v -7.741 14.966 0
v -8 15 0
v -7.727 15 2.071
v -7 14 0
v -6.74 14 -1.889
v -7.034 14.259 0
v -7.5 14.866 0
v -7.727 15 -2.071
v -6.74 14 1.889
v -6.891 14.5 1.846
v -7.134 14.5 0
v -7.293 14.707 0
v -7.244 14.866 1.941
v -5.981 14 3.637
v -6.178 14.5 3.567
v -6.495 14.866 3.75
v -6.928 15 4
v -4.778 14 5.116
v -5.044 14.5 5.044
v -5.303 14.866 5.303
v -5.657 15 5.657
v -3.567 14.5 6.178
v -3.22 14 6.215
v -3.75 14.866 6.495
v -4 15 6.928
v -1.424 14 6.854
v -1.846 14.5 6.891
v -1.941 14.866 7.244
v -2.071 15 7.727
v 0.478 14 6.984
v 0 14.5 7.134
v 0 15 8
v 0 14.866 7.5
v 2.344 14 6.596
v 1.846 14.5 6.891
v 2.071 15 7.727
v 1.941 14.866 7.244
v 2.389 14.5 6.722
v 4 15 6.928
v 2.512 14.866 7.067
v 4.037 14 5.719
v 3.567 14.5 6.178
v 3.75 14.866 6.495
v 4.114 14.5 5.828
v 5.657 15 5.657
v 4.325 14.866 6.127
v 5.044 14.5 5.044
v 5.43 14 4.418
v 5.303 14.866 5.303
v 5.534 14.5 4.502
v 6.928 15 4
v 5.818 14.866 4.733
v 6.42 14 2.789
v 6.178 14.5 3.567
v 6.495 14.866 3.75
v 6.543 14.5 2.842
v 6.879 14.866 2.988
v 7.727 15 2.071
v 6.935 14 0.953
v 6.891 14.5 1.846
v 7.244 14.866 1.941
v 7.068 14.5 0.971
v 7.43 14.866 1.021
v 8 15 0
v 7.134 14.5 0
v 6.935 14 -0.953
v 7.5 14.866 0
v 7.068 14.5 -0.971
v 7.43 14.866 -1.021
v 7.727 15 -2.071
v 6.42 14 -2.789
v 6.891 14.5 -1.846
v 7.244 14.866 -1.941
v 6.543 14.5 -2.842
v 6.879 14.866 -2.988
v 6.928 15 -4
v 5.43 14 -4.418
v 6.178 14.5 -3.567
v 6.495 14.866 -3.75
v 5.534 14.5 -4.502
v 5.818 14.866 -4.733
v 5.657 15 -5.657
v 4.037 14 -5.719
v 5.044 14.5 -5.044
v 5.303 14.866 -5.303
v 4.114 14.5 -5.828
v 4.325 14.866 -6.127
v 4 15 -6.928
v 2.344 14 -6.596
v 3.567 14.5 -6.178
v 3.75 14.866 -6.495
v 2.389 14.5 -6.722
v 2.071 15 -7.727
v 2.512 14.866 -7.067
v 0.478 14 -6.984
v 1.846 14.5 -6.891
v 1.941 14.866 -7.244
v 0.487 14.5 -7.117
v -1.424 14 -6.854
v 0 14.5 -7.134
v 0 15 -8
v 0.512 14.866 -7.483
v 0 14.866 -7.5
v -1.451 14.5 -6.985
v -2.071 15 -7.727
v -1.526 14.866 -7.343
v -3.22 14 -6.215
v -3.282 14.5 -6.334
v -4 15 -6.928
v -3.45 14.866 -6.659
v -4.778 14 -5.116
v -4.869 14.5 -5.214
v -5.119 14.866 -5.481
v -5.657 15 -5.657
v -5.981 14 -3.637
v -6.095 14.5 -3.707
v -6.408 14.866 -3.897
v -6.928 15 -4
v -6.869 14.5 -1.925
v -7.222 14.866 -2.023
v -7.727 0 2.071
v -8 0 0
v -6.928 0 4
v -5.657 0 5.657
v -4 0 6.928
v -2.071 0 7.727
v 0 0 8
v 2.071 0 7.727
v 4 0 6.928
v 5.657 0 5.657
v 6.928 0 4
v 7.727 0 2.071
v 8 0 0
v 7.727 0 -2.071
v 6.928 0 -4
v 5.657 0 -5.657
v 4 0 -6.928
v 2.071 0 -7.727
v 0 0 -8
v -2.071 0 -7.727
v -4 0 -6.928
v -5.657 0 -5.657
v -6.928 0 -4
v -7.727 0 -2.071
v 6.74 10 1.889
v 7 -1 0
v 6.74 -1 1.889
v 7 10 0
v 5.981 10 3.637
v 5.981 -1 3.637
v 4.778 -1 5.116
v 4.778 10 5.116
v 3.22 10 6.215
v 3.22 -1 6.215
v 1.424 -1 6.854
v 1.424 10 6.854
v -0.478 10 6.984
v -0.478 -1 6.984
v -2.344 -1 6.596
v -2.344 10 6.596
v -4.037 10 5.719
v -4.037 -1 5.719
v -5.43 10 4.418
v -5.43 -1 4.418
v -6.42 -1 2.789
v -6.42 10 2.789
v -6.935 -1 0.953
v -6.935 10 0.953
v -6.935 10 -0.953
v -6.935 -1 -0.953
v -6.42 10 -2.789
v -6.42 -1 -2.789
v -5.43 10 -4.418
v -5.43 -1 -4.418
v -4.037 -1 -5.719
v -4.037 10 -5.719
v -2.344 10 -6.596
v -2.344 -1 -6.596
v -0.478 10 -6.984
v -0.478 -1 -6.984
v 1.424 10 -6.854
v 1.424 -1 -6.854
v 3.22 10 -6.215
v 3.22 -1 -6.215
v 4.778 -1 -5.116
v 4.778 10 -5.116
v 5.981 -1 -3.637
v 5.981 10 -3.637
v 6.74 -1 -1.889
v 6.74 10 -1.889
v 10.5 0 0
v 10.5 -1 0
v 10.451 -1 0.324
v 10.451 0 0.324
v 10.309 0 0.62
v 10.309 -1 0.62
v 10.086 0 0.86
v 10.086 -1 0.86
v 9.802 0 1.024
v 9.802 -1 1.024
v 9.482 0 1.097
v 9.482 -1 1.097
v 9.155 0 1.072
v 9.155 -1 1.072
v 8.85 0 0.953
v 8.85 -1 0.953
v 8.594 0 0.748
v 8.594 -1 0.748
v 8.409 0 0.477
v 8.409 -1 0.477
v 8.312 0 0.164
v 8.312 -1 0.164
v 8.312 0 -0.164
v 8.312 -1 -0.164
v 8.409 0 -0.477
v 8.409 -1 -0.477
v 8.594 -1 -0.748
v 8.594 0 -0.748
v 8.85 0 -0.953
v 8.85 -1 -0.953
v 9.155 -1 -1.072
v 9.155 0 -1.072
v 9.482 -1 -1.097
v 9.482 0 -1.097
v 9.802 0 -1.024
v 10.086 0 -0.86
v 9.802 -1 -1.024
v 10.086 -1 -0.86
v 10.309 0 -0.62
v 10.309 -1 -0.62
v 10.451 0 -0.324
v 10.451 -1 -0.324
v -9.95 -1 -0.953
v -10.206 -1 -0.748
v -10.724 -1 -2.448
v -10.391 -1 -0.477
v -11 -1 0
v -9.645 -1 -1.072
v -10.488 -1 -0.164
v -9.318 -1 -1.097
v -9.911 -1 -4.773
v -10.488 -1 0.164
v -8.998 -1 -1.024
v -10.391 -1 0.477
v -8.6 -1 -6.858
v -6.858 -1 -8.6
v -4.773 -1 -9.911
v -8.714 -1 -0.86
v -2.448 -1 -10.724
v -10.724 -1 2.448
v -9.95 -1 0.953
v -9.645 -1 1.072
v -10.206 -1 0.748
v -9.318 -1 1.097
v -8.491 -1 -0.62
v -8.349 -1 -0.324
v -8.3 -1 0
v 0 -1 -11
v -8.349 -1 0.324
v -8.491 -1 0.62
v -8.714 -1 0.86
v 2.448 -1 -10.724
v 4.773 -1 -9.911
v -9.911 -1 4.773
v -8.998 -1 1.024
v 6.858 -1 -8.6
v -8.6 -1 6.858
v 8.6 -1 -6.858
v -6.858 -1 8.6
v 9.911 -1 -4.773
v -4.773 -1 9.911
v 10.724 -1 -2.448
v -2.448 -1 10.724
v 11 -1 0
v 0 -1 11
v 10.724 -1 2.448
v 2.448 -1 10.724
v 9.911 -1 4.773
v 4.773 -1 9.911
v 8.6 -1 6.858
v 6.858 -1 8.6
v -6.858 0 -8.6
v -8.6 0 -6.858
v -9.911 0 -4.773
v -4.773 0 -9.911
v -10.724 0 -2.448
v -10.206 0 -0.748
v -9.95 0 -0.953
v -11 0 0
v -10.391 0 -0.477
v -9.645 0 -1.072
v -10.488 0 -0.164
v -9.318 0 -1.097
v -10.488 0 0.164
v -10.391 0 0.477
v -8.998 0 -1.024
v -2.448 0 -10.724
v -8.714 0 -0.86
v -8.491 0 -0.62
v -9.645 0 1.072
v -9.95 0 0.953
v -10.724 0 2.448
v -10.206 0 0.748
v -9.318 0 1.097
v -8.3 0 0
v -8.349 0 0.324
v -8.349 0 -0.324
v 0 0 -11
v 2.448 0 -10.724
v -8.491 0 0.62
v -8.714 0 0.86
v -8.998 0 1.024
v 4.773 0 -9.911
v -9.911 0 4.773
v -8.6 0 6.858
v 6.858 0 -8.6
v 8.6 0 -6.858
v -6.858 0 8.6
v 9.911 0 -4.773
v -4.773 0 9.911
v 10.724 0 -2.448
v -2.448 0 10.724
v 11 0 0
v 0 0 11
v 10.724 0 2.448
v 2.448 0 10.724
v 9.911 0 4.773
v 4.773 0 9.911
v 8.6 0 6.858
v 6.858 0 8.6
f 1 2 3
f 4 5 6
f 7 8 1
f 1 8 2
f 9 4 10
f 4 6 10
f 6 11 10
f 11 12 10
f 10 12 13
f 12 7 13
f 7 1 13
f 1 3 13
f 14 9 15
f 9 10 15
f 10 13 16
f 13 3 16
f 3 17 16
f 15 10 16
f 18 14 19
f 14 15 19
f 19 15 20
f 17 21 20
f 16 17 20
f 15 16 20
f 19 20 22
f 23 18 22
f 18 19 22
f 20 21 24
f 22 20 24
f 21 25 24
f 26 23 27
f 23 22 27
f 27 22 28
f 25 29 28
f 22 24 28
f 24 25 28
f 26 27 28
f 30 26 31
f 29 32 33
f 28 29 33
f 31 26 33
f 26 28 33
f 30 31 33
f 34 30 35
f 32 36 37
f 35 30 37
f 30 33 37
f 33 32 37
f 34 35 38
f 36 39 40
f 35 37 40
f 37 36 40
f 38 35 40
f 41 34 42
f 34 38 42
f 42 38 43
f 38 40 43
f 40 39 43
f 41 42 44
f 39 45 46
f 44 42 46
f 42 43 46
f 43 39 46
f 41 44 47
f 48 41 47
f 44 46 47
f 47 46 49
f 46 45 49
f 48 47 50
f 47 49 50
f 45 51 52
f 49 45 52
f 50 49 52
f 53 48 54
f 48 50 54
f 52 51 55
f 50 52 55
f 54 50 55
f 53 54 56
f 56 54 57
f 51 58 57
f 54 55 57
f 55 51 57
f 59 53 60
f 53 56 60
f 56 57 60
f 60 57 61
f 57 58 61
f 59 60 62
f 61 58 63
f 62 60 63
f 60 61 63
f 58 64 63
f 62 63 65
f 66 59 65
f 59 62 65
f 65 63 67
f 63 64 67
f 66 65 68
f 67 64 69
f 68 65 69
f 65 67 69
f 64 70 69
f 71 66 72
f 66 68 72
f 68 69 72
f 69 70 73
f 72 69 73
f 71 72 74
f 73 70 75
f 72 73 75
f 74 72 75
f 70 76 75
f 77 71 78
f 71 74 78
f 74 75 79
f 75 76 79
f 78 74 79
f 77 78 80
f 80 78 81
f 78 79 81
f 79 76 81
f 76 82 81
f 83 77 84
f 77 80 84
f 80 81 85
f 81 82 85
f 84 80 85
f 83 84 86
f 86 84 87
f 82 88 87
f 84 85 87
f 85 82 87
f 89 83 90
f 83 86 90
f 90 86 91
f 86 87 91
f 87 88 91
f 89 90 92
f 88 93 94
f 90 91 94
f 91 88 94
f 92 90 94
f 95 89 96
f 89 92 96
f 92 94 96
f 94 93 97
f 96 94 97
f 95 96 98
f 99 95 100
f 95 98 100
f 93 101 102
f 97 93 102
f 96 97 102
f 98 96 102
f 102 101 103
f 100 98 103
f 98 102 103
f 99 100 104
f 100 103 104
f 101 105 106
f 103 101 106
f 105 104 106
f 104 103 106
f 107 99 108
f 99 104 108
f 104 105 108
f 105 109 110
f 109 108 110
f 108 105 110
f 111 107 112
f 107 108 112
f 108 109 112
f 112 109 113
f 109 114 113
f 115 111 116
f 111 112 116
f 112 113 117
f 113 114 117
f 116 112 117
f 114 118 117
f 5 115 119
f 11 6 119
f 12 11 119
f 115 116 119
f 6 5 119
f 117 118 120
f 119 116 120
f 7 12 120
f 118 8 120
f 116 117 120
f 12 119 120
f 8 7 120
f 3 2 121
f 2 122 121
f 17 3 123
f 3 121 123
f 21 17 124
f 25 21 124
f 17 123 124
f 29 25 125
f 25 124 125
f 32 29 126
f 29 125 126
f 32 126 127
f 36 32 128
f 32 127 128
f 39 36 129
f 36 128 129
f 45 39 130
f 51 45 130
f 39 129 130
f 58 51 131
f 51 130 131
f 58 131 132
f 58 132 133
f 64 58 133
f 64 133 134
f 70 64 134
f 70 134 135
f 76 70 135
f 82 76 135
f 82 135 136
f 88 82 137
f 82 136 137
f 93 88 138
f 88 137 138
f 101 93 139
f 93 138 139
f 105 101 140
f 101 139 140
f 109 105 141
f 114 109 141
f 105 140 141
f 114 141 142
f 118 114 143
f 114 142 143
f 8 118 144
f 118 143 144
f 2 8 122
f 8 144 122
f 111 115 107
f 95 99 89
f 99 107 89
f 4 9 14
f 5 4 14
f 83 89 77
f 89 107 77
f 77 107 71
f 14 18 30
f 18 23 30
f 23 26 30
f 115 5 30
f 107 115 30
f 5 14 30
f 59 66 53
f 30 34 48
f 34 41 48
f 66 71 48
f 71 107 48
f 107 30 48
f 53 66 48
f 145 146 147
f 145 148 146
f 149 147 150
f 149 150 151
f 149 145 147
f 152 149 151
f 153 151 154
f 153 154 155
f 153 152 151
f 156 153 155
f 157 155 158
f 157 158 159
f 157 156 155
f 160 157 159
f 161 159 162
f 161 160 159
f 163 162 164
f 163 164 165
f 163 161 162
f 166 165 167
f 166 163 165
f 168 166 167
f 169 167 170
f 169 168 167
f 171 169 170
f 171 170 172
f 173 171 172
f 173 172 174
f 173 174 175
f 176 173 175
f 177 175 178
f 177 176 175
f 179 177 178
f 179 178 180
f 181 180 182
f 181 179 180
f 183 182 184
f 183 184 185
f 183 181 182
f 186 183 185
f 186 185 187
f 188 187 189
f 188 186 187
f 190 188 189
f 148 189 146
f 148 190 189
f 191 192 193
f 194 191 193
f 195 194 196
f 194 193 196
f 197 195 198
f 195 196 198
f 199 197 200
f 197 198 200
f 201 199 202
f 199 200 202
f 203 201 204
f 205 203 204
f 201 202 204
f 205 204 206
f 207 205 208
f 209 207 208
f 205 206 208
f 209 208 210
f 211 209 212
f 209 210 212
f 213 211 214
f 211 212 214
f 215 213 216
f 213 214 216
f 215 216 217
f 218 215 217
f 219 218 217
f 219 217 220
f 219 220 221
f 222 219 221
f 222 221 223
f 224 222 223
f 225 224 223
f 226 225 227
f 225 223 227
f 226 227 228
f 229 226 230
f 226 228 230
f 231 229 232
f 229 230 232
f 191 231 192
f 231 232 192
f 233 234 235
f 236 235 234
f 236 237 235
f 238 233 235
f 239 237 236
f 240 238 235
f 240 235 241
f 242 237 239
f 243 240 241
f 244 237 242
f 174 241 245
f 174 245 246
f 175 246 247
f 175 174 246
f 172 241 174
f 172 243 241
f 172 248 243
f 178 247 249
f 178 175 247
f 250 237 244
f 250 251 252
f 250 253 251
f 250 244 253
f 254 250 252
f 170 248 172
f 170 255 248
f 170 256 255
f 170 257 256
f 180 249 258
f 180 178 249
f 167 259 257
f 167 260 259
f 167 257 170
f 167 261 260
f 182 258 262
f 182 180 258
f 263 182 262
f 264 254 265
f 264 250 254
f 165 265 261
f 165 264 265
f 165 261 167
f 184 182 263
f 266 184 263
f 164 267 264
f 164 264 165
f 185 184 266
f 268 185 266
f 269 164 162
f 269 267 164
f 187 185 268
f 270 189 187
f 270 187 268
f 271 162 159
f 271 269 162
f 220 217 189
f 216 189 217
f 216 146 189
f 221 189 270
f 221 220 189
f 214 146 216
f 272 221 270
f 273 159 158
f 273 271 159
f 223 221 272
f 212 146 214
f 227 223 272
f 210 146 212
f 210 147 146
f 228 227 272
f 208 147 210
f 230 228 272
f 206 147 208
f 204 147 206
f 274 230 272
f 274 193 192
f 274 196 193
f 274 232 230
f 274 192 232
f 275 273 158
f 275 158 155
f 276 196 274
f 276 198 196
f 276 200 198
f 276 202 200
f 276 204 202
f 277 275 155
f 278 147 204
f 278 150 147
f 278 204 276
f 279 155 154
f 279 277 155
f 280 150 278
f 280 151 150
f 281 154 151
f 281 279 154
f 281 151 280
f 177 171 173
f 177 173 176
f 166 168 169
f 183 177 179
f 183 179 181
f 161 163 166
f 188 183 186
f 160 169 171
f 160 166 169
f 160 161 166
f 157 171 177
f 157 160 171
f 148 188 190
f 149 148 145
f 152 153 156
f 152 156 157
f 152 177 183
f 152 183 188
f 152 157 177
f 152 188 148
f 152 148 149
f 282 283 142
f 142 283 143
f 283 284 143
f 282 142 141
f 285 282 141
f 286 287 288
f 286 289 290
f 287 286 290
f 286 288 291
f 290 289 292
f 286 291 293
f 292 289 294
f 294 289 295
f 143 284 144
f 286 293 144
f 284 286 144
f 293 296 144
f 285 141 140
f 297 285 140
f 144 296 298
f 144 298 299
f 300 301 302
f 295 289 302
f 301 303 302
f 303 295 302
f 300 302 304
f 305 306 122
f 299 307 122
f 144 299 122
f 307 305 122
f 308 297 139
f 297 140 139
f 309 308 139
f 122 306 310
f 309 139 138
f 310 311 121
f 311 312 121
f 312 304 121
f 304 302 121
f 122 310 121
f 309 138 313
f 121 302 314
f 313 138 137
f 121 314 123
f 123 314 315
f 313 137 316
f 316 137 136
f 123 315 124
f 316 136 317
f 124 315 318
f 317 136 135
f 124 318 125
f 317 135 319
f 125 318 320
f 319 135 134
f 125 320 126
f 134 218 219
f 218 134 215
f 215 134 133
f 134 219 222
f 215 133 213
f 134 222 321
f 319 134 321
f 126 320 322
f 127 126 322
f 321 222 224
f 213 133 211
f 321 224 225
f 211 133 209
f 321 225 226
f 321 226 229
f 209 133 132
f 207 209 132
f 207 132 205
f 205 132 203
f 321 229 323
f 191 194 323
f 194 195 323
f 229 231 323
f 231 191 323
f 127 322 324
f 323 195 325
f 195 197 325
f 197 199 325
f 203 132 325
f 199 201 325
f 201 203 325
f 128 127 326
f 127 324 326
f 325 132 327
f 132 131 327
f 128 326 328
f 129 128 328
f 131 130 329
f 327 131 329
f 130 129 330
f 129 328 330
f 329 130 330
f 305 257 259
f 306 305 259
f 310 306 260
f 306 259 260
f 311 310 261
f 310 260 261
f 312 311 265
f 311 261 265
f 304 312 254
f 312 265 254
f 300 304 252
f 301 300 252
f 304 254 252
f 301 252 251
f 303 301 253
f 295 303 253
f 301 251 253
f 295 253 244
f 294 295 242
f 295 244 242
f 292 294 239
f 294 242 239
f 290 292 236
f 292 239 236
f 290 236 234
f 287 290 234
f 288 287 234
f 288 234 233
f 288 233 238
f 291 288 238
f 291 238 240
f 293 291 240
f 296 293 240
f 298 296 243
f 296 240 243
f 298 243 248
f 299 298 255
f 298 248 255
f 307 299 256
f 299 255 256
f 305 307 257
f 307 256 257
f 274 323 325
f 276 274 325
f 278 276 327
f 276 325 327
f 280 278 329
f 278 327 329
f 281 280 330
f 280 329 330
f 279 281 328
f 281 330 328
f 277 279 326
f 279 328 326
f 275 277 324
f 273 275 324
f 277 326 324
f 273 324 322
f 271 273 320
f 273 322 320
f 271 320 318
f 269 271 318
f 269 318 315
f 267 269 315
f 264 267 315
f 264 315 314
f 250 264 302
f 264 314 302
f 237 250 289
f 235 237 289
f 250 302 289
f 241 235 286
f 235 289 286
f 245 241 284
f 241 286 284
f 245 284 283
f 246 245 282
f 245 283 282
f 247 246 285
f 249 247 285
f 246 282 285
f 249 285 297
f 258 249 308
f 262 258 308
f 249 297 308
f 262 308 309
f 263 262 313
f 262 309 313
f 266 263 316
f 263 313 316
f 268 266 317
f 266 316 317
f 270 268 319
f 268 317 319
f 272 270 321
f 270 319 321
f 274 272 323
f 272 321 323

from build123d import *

# Parameters (mm, degrees)
SKETCH_2_R          = 7
CUT_EXTRUDE_1_DEPTH = 10
SKETCH_3_R          = 11
SKETCH_3_R_2        = 7
EXTRUDE_1_DEPTH     = 1
SKETCH_4_R          = 1.1
CUT_EXTRUDE_2_DEPTH = 1


with BuildPart() as part:
    # 草图1 → 旋转1 (revolve)
    with BuildSketch(Plane.XY):
        with BuildLine():
            Line((0, 14), (-7, 14))
            ThreePointArc((-7, 14), (-7.292893219, 14.707106781), (-8, 15))
            Line((-8, 15), (-8, 0))
            Line((-8, 0), (0, 0))
            Line((0, 0), (0, 14))
        make_face()
    revolve(axis=Axis((0, 0, 0), (0, 1, 0)))

    # 草图2 → 切除-拉伸1 (cut)
    with BuildSketch(Plane.XZ):
        Circle(SKETCH_2_R)
    extrude(amount=-CUT_EXTRUDE_1_DEPTH, mode=Mode.SUBTRACT)

    # 草图3 → 凸台-拉伸1 (add)
    with BuildSketch(Plane.XZ):
        Circle(SKETCH_3_R)
        Circle(SKETCH_3_R_2, mode=Mode.SUBTRACT)
    extrude(amount=EXTRUDE_1_DEPTH)

    # 草图4 → 切除-拉伸2 (cut)
    with BuildSketch(Plane.XZ.offset(1)):
        with Locations((9.4, 0)):
            Circle(SKETCH_4_R)
        with Locations((-9.4, 0)):
            Circle(SKETCH_4_R)
    extrude(amount=-CUT_EXTRUDE_2_DEPTH, mode=Mode.SUBTRACT)


solid = part.part
